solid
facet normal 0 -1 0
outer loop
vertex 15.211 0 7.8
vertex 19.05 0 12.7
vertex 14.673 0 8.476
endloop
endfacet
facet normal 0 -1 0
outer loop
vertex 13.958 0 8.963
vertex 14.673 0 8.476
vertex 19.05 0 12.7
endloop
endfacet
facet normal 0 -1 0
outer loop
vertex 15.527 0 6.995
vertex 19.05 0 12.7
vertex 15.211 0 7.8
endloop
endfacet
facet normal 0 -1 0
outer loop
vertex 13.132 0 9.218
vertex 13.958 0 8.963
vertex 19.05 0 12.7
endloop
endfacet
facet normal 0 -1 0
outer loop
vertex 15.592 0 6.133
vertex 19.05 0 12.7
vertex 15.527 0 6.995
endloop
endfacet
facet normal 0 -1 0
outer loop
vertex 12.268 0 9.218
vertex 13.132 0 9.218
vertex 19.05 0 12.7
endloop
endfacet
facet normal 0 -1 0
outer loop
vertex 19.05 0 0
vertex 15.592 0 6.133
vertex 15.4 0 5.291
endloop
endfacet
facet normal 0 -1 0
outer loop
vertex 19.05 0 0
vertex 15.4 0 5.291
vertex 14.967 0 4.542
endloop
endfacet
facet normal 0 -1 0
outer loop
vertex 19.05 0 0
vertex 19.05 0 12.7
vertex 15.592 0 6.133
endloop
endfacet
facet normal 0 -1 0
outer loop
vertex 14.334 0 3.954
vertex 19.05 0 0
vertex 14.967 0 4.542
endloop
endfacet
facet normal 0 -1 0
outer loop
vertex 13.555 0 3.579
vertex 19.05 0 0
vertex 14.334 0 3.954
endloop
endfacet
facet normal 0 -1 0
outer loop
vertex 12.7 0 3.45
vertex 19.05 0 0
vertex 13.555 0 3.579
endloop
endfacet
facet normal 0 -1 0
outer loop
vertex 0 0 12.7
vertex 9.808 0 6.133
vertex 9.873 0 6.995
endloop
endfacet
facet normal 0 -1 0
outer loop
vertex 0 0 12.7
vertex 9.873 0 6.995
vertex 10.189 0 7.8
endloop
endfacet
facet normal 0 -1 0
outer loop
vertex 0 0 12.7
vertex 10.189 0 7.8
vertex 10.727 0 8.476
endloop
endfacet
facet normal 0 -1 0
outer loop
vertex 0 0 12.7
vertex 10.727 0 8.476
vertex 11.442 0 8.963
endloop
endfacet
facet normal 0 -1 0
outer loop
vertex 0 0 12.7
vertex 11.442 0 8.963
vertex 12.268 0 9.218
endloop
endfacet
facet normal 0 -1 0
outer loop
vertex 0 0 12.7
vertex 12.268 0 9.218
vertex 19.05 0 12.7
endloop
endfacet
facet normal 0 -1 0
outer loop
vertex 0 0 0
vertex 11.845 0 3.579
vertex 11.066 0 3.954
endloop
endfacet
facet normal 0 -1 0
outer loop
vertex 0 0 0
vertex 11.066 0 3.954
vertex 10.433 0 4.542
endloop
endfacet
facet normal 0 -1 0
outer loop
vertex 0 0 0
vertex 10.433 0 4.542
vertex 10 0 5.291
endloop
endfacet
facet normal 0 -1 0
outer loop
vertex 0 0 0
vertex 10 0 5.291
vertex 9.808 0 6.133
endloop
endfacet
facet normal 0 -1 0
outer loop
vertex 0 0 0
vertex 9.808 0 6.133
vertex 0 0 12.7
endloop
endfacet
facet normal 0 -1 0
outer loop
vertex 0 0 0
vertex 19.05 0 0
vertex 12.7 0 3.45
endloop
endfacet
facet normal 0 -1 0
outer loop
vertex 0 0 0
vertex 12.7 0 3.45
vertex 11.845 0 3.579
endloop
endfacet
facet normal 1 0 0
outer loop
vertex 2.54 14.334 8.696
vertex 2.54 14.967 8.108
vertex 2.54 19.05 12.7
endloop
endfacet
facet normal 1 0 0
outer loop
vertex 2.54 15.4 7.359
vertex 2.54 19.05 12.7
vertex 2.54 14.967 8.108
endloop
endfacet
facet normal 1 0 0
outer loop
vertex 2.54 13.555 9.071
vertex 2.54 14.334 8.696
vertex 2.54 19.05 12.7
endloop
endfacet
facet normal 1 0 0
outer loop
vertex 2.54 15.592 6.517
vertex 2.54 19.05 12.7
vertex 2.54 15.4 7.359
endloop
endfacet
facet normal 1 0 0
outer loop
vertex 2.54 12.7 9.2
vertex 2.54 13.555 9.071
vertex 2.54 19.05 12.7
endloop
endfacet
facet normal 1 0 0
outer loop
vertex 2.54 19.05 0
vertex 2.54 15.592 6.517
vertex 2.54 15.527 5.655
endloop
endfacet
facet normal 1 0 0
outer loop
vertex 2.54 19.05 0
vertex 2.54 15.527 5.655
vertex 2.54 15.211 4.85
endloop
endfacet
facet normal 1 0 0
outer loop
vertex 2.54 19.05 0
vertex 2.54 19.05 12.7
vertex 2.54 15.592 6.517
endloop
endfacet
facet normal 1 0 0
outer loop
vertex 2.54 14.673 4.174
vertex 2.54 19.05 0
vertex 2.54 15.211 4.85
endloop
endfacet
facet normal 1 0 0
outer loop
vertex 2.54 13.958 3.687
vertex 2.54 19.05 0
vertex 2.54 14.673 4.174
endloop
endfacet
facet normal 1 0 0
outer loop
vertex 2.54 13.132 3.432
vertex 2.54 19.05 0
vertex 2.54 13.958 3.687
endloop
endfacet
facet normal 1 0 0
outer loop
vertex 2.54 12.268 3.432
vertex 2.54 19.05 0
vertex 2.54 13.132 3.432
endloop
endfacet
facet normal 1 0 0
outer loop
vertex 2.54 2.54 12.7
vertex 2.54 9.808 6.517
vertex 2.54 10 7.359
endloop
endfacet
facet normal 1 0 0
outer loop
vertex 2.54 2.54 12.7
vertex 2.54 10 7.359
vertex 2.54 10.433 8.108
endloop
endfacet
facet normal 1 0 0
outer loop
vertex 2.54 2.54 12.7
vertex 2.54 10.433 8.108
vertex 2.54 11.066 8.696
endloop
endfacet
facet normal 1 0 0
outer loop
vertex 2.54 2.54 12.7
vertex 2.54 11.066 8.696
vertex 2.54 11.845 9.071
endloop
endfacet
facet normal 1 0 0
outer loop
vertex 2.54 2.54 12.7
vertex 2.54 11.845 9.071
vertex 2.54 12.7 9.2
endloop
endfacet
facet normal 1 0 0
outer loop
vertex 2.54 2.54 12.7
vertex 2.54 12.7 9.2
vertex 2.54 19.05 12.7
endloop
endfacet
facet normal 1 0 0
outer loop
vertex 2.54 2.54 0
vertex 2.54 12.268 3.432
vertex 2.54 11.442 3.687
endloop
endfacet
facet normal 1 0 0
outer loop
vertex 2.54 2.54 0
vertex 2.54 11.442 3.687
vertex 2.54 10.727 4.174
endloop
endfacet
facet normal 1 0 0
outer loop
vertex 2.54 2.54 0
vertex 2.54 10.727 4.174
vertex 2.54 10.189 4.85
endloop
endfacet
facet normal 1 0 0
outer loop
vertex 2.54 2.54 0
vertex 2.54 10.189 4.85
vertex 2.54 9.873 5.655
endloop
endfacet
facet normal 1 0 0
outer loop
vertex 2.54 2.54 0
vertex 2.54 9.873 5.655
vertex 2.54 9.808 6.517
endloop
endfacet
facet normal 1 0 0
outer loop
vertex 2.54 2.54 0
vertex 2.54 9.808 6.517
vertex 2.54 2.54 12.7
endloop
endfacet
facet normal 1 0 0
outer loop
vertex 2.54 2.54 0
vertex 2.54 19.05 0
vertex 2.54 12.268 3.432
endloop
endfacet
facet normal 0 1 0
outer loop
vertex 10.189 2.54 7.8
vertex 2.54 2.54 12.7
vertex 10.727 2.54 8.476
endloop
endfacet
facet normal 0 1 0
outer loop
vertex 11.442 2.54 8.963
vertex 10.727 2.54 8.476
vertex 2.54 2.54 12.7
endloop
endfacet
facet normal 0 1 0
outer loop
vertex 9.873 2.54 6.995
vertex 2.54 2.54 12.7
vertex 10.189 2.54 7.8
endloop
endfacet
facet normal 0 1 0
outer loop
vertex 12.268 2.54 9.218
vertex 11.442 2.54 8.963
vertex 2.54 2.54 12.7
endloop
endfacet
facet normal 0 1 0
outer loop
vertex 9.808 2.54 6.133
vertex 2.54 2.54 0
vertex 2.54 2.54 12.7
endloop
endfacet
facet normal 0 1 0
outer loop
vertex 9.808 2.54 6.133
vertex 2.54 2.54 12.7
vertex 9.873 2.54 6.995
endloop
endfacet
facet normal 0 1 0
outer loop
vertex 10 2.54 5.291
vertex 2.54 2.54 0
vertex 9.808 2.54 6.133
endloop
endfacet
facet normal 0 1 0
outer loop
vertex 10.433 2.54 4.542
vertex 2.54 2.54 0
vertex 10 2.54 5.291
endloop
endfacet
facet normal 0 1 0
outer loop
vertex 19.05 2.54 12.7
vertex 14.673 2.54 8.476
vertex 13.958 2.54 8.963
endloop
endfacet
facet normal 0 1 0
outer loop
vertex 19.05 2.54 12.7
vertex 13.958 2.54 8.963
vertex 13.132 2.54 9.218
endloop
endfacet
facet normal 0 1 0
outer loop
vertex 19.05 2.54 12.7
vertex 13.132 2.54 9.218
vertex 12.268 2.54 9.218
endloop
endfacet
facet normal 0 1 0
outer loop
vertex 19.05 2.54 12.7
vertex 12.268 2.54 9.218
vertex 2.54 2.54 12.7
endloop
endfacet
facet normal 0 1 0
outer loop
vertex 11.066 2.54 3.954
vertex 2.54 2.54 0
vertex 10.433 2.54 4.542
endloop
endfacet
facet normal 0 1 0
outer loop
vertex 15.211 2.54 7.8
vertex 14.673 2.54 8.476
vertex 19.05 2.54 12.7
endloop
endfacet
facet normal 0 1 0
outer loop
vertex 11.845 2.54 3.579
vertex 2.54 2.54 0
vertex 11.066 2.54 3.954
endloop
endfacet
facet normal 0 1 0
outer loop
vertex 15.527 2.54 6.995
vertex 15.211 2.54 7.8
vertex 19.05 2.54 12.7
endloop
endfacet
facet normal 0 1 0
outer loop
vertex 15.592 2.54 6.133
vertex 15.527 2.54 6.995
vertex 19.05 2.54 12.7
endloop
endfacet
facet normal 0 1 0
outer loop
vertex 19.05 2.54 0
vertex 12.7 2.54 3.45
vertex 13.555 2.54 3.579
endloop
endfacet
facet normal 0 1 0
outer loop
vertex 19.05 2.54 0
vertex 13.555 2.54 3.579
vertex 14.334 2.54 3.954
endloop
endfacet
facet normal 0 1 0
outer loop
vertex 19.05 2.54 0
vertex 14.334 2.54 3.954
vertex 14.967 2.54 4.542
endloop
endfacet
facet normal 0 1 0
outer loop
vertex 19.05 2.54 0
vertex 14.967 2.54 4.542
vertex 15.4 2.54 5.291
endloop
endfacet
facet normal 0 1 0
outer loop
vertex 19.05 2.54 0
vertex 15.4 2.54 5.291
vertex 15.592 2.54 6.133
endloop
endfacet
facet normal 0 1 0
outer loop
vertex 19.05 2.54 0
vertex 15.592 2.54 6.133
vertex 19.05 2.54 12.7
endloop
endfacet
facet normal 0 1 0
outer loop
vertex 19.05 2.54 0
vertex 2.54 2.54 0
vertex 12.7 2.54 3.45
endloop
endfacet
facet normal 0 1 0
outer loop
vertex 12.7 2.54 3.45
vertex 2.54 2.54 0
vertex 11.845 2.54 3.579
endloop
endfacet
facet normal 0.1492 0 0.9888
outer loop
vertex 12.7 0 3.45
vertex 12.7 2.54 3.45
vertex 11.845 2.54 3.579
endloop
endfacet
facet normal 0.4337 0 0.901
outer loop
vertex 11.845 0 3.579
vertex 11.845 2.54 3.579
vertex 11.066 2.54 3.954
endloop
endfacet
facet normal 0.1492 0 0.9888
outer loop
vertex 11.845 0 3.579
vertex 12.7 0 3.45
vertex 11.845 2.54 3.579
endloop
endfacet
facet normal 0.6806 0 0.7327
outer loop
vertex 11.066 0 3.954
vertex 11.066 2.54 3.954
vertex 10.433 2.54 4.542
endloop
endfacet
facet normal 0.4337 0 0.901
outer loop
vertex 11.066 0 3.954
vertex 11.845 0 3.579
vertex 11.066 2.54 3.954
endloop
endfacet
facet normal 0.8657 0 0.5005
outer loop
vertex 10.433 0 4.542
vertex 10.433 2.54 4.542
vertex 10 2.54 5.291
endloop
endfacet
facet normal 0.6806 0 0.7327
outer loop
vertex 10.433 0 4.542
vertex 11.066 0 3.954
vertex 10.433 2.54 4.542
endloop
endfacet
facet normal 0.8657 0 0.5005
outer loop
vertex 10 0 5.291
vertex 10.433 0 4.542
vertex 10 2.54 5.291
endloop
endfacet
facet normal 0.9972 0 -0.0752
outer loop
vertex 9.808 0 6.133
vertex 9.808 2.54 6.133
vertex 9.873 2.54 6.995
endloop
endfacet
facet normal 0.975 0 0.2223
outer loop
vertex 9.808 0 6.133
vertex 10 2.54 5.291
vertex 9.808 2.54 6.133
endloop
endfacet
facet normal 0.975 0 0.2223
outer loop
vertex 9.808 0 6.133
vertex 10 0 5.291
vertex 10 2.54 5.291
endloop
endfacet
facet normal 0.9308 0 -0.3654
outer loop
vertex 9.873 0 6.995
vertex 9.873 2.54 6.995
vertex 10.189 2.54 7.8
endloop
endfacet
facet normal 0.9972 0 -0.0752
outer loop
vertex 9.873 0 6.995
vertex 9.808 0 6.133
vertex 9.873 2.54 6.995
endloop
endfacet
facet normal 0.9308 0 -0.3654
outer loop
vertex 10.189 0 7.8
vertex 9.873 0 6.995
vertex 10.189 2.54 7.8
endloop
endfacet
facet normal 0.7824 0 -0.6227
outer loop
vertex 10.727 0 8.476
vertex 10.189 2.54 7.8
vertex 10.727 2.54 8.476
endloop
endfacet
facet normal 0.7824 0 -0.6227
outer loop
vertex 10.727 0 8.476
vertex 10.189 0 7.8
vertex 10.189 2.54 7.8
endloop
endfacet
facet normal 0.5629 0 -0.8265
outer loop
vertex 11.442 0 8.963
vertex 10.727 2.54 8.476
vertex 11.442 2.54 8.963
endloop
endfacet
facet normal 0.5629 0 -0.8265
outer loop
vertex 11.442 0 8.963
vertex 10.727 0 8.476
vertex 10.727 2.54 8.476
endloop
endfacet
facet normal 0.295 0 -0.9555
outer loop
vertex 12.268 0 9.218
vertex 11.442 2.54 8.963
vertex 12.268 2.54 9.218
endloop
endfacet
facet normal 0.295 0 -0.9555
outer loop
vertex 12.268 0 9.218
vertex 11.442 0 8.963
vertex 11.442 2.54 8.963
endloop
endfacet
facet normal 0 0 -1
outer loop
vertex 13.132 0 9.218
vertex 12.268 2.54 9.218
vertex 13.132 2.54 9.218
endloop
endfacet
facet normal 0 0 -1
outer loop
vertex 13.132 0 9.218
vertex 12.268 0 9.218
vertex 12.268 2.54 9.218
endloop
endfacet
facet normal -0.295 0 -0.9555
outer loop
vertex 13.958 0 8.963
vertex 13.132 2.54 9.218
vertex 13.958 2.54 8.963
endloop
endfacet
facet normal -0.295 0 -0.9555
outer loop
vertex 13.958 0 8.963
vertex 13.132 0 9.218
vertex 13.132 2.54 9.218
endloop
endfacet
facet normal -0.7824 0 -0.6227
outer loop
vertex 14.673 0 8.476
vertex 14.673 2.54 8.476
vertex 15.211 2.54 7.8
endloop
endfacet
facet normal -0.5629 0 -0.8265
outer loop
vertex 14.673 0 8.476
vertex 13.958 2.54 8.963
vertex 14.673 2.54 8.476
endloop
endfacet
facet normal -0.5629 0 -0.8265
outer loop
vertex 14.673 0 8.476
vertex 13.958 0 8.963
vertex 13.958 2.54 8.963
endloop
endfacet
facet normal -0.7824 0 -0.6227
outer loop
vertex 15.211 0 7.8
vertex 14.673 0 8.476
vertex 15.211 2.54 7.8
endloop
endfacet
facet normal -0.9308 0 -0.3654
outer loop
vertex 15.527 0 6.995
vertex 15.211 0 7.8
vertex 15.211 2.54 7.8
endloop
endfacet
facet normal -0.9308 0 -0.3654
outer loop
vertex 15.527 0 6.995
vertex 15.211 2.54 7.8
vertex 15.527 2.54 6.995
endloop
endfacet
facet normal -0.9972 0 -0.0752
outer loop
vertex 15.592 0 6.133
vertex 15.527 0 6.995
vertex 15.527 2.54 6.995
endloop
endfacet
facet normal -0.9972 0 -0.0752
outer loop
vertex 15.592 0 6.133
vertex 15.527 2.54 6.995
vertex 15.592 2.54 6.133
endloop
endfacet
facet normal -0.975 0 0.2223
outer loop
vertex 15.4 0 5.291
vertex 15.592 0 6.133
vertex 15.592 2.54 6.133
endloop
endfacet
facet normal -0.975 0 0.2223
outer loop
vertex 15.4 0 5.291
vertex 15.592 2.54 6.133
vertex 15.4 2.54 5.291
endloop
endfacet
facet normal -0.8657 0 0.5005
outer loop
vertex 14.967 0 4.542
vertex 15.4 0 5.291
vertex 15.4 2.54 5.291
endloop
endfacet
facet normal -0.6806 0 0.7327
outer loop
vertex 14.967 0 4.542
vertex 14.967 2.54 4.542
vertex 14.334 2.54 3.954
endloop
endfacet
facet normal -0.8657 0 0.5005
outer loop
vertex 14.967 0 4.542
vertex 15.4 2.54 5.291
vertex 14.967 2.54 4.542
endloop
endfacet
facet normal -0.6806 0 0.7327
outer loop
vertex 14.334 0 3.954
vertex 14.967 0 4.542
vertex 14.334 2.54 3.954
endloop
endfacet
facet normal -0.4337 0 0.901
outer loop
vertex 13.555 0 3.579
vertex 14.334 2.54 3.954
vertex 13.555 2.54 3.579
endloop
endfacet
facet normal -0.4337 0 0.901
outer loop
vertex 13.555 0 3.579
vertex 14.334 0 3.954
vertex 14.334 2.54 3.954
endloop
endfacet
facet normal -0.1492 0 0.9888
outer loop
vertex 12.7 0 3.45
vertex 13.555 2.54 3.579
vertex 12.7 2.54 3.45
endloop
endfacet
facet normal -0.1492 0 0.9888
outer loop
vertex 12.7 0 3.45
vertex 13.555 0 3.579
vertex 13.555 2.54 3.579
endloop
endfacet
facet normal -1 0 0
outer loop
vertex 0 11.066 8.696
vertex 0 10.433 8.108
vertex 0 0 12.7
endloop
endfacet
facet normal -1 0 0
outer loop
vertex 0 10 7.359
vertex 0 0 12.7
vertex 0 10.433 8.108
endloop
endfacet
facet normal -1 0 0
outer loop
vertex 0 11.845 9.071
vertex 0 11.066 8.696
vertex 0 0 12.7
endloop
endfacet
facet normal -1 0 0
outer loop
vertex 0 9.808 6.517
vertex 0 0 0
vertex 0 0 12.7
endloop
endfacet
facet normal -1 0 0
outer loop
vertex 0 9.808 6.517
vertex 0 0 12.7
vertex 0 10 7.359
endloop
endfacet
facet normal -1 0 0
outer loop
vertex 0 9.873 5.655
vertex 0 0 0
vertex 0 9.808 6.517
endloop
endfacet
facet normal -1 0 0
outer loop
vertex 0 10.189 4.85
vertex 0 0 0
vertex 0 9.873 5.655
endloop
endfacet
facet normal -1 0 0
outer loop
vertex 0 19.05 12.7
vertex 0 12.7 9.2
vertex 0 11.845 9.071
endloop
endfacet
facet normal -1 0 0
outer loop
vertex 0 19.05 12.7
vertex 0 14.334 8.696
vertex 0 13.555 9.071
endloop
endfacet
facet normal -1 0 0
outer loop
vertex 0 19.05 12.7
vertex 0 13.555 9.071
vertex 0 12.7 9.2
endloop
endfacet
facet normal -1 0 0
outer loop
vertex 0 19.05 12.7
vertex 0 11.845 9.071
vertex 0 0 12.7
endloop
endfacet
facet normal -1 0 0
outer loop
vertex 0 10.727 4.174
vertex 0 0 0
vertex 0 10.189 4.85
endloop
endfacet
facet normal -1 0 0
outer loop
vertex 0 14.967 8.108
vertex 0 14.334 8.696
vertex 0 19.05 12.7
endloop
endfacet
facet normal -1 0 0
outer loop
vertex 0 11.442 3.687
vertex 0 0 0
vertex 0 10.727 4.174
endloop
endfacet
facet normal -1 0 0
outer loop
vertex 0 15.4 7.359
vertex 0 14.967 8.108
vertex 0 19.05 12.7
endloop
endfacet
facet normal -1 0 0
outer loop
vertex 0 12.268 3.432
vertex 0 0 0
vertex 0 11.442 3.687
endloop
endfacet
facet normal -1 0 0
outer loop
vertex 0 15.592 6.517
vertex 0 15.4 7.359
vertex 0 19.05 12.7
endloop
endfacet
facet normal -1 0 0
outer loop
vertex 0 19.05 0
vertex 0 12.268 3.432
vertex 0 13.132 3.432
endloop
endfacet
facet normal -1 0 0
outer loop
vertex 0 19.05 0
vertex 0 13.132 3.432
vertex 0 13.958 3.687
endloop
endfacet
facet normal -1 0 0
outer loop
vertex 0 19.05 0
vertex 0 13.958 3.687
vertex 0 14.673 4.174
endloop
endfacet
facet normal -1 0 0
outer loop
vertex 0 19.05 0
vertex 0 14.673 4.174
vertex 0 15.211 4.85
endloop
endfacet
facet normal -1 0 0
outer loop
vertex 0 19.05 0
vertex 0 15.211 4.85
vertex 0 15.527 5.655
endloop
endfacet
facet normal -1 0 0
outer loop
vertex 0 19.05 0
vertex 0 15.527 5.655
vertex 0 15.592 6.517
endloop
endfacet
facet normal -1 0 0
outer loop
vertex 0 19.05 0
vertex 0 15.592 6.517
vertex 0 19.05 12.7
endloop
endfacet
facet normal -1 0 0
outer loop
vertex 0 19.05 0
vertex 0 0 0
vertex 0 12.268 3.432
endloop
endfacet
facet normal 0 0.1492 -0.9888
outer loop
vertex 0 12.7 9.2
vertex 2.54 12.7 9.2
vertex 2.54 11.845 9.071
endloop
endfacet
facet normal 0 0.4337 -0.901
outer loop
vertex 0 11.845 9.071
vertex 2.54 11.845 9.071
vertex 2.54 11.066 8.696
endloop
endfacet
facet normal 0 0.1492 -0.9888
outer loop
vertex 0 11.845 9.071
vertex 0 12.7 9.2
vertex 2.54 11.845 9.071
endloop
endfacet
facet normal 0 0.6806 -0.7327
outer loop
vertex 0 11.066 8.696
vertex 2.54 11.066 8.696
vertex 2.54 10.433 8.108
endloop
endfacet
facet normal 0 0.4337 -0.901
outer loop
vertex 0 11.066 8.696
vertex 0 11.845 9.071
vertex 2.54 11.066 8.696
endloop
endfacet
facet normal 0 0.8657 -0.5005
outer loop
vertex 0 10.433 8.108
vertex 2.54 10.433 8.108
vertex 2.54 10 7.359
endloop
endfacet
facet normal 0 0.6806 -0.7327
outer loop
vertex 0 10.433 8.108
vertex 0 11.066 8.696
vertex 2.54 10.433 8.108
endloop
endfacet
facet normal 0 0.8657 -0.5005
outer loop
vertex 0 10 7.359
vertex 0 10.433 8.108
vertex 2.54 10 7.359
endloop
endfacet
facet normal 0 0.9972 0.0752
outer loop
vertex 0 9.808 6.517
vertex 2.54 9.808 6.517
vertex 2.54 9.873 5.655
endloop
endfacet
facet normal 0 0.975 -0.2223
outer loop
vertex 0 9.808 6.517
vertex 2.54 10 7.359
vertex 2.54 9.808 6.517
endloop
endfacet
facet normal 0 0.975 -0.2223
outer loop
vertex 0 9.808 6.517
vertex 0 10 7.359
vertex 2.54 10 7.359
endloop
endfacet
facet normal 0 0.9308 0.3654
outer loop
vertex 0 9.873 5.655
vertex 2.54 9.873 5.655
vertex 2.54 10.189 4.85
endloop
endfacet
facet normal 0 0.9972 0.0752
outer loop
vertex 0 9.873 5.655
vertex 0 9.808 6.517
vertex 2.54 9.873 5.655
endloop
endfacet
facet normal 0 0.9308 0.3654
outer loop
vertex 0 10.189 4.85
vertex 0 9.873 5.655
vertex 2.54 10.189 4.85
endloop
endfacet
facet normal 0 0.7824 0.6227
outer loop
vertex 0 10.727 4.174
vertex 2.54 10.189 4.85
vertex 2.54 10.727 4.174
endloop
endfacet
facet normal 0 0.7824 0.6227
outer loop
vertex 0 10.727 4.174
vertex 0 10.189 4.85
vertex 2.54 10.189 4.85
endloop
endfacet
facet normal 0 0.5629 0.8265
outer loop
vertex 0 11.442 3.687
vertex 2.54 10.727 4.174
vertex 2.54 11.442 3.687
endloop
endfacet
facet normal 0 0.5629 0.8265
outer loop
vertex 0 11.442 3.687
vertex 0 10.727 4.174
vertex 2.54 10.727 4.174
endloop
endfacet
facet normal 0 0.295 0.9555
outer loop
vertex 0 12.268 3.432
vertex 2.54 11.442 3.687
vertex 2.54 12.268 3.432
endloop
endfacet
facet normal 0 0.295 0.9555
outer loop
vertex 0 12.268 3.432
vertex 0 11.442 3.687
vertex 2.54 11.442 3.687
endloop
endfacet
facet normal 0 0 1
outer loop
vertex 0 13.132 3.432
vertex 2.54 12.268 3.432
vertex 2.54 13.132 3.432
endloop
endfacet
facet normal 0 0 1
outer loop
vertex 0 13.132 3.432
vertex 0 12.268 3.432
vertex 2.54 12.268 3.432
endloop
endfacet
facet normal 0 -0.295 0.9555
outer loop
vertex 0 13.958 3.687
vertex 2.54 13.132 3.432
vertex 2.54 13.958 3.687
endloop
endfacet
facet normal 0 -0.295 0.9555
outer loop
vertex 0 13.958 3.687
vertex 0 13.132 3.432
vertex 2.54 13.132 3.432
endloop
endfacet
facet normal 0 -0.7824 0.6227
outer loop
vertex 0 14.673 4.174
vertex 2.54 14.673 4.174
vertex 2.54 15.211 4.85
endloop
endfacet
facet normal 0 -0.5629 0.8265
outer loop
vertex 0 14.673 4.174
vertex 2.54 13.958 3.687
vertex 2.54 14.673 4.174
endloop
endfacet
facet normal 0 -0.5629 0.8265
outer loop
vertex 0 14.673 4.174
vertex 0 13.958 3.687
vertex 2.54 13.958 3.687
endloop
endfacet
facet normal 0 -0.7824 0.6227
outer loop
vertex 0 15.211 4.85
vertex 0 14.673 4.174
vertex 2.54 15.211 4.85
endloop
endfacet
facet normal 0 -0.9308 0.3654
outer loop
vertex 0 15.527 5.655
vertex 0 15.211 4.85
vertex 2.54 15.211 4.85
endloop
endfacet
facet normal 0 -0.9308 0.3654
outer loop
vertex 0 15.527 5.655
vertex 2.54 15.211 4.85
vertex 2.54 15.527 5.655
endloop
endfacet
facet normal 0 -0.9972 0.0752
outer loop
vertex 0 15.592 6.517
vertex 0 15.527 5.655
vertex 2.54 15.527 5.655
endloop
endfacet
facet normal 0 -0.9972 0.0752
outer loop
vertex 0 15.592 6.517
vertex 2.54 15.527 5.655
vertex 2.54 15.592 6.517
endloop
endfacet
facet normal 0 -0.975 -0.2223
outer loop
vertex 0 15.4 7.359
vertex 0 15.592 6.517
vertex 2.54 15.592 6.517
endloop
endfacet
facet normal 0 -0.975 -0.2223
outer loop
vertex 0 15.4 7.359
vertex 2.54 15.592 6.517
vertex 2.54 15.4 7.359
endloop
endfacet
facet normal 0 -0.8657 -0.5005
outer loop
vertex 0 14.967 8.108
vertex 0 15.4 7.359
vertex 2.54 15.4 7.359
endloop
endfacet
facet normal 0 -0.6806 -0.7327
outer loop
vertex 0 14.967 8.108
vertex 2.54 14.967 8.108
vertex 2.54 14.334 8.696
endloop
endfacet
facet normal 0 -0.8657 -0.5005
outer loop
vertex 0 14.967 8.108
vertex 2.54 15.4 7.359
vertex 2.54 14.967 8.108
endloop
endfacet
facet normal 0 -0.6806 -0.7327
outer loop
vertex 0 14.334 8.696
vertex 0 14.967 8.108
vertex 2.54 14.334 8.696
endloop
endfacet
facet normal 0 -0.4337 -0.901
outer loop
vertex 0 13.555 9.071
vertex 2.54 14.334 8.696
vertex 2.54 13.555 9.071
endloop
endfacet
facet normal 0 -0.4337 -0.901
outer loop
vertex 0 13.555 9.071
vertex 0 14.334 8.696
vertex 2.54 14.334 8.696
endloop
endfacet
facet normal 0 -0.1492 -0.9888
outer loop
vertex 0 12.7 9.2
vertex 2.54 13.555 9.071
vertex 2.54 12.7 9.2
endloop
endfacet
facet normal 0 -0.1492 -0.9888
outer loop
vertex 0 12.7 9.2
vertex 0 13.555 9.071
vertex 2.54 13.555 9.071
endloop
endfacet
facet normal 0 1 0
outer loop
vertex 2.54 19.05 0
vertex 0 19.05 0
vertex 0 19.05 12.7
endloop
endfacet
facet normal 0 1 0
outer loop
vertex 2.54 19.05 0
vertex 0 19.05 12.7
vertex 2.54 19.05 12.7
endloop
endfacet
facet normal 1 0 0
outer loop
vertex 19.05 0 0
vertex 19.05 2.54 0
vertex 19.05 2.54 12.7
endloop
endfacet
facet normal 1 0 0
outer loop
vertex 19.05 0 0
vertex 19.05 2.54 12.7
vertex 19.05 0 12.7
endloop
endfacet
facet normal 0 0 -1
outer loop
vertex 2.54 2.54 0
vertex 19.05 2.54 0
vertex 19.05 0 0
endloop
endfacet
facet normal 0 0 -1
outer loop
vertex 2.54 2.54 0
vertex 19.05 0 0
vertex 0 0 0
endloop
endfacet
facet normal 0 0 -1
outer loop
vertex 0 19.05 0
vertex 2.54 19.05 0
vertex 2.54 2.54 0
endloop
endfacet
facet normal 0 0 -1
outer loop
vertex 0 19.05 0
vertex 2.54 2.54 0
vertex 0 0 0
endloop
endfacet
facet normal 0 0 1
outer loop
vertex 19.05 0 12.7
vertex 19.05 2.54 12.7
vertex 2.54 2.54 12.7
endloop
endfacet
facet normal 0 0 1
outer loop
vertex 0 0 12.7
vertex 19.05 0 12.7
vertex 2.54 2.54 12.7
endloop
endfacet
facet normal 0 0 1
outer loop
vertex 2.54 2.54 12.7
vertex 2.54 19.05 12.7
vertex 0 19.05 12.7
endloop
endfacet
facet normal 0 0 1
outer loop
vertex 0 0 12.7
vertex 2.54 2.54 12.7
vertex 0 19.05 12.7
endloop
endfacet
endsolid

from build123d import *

# Parameters (mm, degrees)
BOSS_EXTRUDE1_DEPTH = 12.7
SKETCH2_R           = 2.9
CUT_EXTRUDE1_DEPTH  = 12.7
SKETCH3_R           = 2.9
CUT_EXTRUDE3_DEPTH  = 12.7


with BuildPart() as part:
    # Sketch1 → Boss-Extrude1 (new body)
    with BuildSketch(Plane.XY):
        Polygon((0, 0), (0, 19.05), (2.54, 19.05), (2.54, 2.54), (19.05, 2.54), (19.05, 0), align=None)
    extrude(amount=BOSS_EXTRUDE1_DEPTH)

    # Sketch2 → Cut-Extrude1 (cut)
    with BuildSketch(Plane(origin=(0, 0, 0), x_dir=(0, 0, -1), z_dir=(1, 0, 0))):
        with Locations(Location((-6.299909987, 12.7, 0), (0, 0, 180))):
            Circle(SKETCH2_R)
    extrude(amount=CUT_EXTRUDE1_DEPTH, mode=Mode.SUBTRACT)

    # Sketch3 → Cut-Extrude3 (cut)
    with BuildSketch(Plane(origin=(0, 0, 0), x_dir=(1, 0, 0), z_dir=(0, 1, 0))):
        with Locations(Location((12.7, -6.35, 0), (0, 0, 90))):
            Circle(SKETCH3_R)
    extrude(amount=CUT_EXTRUDE3_DEPTH, mode=Mode.SUBTRACT)


solid = part.part
